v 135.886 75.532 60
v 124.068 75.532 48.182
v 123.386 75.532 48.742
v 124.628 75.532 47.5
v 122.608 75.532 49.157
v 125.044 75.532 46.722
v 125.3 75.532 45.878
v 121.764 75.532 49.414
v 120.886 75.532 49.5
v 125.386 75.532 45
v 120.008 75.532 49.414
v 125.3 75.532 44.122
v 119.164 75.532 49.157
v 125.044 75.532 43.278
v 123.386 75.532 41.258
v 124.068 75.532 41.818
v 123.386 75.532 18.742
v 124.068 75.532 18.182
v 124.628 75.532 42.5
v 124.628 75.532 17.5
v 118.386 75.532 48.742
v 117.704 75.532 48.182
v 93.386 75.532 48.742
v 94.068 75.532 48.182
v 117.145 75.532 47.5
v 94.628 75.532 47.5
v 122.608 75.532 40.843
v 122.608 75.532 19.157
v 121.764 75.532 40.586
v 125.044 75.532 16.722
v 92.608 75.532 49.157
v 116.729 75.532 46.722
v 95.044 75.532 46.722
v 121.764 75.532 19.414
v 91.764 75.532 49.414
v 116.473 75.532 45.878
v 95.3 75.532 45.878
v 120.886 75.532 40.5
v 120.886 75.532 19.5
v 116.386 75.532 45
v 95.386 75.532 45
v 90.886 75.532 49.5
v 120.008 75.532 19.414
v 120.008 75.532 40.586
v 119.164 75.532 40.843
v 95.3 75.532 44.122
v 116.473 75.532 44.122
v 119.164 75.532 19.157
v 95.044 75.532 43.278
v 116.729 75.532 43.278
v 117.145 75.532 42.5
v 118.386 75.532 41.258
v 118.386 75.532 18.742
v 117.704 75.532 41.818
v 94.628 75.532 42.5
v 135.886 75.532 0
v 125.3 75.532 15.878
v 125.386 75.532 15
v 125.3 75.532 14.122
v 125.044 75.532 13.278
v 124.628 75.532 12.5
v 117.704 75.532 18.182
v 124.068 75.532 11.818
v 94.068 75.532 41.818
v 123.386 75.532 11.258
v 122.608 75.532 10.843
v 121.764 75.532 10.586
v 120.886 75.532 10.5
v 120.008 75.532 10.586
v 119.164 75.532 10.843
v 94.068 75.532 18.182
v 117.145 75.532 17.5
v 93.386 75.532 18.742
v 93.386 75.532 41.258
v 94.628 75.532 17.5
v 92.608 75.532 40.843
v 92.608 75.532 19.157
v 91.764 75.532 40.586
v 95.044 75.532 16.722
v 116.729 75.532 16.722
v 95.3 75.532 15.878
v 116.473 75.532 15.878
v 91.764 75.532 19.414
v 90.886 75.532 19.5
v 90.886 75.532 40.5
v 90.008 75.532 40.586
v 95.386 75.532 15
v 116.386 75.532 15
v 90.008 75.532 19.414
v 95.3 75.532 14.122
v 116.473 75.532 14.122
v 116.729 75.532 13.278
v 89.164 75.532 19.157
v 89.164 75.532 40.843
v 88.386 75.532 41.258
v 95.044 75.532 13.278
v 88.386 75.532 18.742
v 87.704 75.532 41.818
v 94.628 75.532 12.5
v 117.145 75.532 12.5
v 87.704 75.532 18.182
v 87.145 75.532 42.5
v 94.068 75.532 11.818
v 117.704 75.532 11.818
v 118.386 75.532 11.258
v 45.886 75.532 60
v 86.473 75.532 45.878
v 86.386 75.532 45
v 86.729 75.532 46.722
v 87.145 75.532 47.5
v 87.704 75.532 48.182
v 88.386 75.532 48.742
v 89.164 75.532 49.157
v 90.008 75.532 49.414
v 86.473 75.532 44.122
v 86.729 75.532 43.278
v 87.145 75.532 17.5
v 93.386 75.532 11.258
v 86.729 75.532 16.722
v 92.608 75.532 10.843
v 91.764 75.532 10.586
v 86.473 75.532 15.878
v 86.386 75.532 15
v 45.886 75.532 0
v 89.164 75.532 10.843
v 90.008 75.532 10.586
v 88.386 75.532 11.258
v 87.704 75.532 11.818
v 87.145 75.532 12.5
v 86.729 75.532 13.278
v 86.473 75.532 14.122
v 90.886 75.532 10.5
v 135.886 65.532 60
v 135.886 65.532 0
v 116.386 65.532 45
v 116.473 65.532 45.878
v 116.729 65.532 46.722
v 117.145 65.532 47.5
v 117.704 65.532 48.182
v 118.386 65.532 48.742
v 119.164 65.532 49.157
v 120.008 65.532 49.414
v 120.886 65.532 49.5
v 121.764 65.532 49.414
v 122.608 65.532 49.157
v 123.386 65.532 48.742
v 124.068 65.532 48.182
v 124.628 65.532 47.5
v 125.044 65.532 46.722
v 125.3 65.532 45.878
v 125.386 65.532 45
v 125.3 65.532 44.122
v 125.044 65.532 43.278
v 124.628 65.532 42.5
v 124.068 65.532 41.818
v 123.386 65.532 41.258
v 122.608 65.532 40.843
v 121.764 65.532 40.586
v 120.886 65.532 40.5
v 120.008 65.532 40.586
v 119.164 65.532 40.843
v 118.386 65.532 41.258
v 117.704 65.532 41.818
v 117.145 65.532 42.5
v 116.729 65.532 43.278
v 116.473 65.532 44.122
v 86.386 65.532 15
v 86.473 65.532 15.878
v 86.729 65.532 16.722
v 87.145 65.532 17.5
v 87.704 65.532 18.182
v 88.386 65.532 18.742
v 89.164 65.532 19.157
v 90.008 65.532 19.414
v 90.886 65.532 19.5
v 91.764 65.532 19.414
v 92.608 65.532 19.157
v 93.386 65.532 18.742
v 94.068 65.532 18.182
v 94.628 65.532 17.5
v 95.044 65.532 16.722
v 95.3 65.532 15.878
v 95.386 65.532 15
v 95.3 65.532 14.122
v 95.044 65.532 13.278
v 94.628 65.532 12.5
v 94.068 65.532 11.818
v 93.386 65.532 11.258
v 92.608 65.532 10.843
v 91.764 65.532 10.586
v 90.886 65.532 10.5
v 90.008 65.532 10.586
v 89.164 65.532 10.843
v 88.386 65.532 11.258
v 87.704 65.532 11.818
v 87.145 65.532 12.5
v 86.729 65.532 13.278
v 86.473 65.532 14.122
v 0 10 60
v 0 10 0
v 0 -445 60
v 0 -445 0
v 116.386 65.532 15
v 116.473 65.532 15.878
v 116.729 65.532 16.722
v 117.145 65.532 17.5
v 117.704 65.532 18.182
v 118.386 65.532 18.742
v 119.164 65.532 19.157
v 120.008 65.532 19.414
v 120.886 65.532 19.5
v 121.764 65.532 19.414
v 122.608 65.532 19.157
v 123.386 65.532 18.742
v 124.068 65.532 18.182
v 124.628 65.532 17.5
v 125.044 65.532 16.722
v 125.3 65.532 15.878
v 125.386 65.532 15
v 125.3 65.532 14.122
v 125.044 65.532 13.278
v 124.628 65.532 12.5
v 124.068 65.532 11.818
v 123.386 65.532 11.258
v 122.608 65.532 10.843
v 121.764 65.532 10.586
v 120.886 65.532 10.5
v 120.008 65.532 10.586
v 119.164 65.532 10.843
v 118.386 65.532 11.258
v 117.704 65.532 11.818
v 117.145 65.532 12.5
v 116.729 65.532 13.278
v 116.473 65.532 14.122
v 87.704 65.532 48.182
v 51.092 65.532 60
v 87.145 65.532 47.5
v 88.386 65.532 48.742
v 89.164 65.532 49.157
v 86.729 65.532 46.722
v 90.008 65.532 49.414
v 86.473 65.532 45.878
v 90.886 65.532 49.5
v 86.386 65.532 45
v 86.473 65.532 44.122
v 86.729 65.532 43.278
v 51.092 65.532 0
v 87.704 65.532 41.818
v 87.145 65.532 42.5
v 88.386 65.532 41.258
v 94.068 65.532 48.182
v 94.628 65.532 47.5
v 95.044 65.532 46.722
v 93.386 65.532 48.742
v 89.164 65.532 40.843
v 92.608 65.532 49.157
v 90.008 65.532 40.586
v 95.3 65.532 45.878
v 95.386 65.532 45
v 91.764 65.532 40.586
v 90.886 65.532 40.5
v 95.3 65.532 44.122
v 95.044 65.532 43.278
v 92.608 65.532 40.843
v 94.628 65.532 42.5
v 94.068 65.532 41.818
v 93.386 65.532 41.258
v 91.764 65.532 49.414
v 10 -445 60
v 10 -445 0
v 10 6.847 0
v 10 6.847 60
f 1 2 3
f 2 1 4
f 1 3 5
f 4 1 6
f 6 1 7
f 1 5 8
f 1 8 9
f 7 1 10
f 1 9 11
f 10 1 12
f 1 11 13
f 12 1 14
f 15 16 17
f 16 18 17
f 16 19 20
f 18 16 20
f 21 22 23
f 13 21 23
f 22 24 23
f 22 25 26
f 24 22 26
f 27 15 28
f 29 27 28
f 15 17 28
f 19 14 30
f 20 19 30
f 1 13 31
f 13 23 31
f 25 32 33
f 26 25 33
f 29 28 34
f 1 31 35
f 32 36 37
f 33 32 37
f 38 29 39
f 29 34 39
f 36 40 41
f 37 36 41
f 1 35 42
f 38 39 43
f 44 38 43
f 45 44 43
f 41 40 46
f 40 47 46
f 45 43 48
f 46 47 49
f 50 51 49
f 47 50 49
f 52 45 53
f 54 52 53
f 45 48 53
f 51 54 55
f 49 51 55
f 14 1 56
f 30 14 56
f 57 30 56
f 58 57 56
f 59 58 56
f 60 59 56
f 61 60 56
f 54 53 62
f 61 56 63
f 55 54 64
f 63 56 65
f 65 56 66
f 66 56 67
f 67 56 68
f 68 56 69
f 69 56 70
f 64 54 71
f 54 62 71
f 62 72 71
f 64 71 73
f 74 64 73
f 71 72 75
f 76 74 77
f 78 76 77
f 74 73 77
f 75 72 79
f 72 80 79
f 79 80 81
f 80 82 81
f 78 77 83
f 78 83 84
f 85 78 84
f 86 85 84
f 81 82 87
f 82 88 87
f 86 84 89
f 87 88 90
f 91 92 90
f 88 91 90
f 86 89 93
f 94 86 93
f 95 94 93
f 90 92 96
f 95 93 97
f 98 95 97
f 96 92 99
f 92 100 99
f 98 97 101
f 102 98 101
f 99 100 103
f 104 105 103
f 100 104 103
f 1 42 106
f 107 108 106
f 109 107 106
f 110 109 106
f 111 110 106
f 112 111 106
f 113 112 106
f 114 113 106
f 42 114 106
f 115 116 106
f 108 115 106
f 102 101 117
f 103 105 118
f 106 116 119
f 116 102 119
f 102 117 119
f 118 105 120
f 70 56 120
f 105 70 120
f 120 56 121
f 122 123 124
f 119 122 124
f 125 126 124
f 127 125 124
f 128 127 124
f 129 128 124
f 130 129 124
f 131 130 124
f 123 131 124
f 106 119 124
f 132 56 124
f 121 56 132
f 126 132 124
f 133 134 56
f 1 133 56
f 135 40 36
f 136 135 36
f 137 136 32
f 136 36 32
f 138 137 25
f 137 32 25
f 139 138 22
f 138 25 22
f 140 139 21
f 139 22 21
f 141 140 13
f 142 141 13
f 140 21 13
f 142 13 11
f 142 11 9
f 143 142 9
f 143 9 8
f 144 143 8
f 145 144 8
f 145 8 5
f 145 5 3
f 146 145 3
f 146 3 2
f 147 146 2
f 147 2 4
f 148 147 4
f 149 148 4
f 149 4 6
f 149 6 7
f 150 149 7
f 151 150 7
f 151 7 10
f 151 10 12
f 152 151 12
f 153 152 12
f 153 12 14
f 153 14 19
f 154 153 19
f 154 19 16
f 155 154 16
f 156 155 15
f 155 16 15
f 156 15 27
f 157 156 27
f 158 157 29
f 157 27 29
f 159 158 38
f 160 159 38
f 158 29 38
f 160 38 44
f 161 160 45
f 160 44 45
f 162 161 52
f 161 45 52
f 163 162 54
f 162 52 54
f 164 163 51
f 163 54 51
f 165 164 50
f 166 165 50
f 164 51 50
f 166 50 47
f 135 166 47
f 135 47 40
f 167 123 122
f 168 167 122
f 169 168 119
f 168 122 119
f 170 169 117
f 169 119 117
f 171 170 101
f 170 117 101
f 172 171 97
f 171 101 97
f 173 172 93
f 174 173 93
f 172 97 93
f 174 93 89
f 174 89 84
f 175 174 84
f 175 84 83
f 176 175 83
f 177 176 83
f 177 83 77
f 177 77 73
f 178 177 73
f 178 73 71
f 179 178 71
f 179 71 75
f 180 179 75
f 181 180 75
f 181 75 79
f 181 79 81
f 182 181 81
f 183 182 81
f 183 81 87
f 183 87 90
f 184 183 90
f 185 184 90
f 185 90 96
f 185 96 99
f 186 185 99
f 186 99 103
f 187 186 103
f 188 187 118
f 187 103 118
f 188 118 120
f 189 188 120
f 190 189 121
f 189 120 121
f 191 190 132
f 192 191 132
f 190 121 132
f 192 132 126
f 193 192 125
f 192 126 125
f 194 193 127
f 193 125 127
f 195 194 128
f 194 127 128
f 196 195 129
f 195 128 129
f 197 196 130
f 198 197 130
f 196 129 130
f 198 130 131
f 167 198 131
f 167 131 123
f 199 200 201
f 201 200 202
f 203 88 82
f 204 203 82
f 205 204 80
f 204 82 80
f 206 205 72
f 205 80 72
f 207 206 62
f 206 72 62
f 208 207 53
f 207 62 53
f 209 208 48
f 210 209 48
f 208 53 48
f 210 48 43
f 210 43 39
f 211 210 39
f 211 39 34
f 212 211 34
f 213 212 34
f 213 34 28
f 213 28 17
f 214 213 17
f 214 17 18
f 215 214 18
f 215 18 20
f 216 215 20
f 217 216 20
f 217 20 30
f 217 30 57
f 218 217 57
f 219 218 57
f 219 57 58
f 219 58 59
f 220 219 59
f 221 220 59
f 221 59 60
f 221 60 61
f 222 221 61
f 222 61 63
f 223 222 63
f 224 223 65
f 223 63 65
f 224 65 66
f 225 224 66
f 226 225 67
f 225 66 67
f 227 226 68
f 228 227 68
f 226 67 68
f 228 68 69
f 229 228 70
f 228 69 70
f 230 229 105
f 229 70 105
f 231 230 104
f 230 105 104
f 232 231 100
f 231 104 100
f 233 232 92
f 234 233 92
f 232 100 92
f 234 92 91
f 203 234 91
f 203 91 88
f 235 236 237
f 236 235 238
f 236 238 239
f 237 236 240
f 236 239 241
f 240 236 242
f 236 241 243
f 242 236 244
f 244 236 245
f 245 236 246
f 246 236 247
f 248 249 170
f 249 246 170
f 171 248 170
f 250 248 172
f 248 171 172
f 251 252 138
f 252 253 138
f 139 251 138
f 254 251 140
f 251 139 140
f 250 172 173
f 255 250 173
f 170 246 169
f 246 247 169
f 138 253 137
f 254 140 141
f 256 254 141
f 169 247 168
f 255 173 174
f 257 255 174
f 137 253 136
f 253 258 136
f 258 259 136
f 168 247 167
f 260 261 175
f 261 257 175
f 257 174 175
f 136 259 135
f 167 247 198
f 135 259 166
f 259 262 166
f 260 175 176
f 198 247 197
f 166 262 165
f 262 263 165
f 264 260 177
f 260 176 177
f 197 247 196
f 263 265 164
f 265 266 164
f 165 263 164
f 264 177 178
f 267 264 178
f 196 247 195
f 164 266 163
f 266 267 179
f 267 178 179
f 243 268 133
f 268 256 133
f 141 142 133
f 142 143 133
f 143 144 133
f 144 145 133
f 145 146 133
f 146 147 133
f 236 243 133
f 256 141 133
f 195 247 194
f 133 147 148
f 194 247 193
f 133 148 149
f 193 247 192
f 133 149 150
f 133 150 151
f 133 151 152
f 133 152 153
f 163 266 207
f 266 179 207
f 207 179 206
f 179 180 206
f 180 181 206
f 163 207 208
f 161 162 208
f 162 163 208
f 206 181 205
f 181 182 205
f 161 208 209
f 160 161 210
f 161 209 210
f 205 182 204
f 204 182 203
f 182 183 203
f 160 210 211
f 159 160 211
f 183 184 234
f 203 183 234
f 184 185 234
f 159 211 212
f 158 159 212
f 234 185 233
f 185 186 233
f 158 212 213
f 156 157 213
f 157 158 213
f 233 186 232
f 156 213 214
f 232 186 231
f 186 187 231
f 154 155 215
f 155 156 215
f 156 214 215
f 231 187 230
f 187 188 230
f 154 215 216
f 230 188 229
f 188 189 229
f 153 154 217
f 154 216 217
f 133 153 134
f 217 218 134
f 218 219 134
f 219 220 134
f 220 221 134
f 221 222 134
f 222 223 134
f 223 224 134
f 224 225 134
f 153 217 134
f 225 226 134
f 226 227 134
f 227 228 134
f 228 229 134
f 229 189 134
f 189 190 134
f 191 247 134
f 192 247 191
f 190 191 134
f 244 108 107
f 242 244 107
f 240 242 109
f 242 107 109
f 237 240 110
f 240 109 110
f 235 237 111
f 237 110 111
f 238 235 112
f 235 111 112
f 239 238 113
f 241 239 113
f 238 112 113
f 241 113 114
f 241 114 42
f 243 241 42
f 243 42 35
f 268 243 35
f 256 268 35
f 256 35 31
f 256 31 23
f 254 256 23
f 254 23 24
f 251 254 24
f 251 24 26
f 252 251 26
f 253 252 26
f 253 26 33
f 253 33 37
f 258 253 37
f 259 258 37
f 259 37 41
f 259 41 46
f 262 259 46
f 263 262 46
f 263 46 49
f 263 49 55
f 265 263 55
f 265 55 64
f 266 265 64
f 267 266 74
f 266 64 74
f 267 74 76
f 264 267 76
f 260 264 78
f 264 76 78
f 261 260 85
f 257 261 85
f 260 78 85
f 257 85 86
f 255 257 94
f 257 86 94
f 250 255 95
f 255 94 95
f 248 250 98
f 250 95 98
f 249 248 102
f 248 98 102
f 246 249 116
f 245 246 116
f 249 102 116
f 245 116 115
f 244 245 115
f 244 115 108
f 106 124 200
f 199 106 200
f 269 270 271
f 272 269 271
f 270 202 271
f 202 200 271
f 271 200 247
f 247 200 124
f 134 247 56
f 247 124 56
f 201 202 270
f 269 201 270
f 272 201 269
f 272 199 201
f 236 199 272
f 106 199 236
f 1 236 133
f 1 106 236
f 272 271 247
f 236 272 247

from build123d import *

# Parameters (mm, degrees)
BOSS_EXTRUDE1_DEPTH = 60
CUT_EXTRUDE1_REACH  = 543.312
SKETCH2_R           = 4.5


with BuildPart() as part:
    # Sketch1 → Boss-Extrude1 (new body)
    with BuildSketch(Plane.XY):
        Polygon((0, 0), (0, -445), (10, -445), (10, 0), (10, 6.847012111), (51.091785414, 65.532163543), (135.886114908, 65.532163543), (135.886114908, 75.532163543), (45.886114908, 75.532163543), (0, 10), align=None)
    extrude(amount=BOSS_EXTRUDE1_DEPTH)

    # Sketch2 → Cut-Extrude1 (cut, up to next)
    with BuildSketch(Plane(origin=(0, 75.532163543, 0), x_dir=(1, 0, 0), z_dir=(0, 1, 0)), mode=Mode.PRIVATE) as cut_extrude1_sk1:
        with Locations(Location((120.886114908, -15, 0), (0, 0, 180))):
            Circle(SKETCH2_R)
    cut_extrude1_tool1 = extrude(cut_extrude1_sk1.sketch, amount=-CUT_EXTRUDE1_REACH, mode=Mode.PRIVATE) & part.part
    # Sketch2 → Cut-Extrude1 (cut, up to next)
    with BuildSketch(Plane(origin=(0, 75.532163543, 0), x_dir=(1, 0, 0), z_dir=(0, 1, 0)), mode=Mode.PRIVATE) as cut_extrude1_sk2:
        with Locations(Location((120.886114908, -45, 0), (0, 0, 180))):
            Circle(SKETCH2_R)
    cut_extrude1_tool2 = extrude(cut_extrude1_sk2.sketch, amount=-CUT_EXTRUDE1_REACH, mode=Mode.PRIVATE) & part.part
    # Sketch2 → Cut-Extrude1 (cut, up to next)
    with BuildSketch(Plane(origin=(0, 75.532163543, 0), x_dir=(1, 0, 0), z_dir=(0, 1, 0)), mode=Mode.PRIVATE) as cut_extrude1_sk3:
        with Locations(Location((90.886114908, -15, 0), (0, 0, 180))):
            Circle(SKETCH2_R)
    cut_extrude1_tool3 = extrude(cut_extrude1_sk3.sketch, amount=-CUT_EXTRUDE1_REACH, mode=Mode.PRIVATE) & part.part
    # Sketch2 → Cut-Extrude1 (cut, up to next)
    with BuildSketch(Plane(origin=(0, 75.532163543, 0), x_dir=(1, 0, 0), z_dir=(0, 1, 0)), mode=Mode.PRIVATE) as cut_extrude1_sk4:
        with Locations(Location((90.886114908, -45, 0), (0, 0, 180))):
            Circle(SKETCH2_R)
    cut_extrude1_tool4 = extrude(cut_extrude1_sk4.sketch, amount=-CUT_EXTRUDE1_REACH, mode=Mode.PRIVATE) & part.part
    add(cut_extrude1_tool1.solids().sort_by_distance((120.886115, 75.532164, 15))[0], mode=Mode.SUBTRACT)
    add(cut_extrude1_tool2.solids().sort_by_distance((120.886115, 75.532164, 45))[0], mode=Mode.SUBTRACT)
    add(cut_extrude1_tool3.solids().sort_by_distance((90.886115, 75.532164, 15))[0], mode=Mode.SUBTRACT)
    add(cut_extrude1_tool4.solids().sort_by_distance((90.886115, 75.532164, 45))[0], mode=Mode.SUBTRACT)


solid = part.part
